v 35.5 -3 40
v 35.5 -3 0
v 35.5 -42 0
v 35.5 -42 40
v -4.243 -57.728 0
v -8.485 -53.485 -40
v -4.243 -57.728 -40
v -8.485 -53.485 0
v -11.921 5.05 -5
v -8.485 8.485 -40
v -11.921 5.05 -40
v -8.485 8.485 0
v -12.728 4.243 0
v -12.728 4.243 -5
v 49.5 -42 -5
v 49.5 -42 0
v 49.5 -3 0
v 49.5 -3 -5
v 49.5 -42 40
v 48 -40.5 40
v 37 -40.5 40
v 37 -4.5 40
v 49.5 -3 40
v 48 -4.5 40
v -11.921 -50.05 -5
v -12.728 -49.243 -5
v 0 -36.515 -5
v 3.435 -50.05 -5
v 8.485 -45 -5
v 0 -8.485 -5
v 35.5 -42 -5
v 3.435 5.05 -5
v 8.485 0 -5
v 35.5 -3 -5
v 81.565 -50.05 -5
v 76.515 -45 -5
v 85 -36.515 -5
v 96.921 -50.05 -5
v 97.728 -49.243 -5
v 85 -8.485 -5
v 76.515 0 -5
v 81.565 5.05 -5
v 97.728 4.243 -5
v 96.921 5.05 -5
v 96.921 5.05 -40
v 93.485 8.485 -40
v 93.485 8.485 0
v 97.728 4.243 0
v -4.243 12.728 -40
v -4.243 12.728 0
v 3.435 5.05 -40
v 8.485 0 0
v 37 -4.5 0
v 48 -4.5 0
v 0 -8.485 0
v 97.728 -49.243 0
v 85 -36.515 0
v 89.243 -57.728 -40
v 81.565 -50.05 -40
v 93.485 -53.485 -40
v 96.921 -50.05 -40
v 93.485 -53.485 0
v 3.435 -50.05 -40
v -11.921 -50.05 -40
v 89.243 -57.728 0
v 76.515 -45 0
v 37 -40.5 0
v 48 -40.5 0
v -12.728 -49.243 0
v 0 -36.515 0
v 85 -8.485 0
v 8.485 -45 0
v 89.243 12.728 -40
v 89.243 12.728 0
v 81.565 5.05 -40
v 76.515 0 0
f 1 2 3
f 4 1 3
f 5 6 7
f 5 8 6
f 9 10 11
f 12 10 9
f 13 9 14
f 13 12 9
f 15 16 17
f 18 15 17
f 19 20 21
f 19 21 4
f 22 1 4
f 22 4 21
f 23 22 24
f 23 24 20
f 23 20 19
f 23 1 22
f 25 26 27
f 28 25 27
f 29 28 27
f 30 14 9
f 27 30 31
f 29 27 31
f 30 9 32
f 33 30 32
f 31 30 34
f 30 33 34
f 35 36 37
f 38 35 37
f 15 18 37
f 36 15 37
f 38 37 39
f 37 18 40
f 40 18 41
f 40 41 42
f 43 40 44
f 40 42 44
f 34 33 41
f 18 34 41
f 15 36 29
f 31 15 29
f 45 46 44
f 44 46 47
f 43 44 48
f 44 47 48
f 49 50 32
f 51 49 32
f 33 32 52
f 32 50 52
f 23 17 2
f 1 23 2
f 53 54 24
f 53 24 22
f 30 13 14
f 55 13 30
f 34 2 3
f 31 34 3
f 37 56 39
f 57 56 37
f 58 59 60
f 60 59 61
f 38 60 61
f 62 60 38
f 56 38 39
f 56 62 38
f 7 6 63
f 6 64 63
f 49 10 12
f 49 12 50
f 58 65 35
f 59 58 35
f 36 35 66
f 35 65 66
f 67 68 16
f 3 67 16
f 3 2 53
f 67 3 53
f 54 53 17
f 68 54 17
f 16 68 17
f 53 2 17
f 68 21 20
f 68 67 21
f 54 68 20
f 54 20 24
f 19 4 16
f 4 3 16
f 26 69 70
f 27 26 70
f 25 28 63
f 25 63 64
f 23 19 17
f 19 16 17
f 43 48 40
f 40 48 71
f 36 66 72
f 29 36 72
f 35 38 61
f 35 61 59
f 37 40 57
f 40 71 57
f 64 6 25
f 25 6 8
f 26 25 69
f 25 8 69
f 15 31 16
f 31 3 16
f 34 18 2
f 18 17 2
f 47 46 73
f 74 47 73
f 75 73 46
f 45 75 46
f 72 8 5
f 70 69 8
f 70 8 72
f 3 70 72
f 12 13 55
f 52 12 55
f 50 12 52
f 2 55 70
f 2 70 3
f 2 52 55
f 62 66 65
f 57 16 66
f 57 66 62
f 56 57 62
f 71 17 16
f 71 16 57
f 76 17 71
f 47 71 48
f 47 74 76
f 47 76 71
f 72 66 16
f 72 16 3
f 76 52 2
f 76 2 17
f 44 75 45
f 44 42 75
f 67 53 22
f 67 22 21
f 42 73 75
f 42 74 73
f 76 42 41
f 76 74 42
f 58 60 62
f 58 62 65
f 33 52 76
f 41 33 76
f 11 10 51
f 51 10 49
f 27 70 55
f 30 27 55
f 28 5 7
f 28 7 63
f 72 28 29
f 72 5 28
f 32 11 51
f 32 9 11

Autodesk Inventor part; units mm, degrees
ref_plane "YZ Plane" through (0, 0, 0) normal (1, 0, 0) x (0, 1, 0)
ref_plane "XZ Plane" through (0, 0, 0) normal (0, 1, 0) x (-1, 0, 0)
ref_plane "XY Plane" through (0, 0, 0) normal (0, 0, 1) x (1, 0, 0)
sketch "Sketch1" plane through (0, 0, 0) normal (0, 0, 1) x (1, 0, 0)
  line L0 (0, 0) -> (85, 0)
  line L1 (85, 0) -> (85, -45)
  line L2 (85, -45) -> (0, -45)
  line L3 (0, -45) -> (0, 0)
  line L4 (0, -45) -> (-8.4853, -53.4853)
  line L5 (0, -45) -> (12, -45) construction
  line L6 (0, 0) -> (-8.4853, 8.4853)
  line L7 (0, 0) -> (12, 0) construction
  line L8 (85, 0) -> (93.4853, 8.4853)
  line L9 (85, 0) -> (97, 0) construction
  line L10 (85, -45) -> (93.4853, -53.4853)
  line L11 (-8.4853, 8.4853) -> (-4.2426, 12.7279)
  line L12 (-8.4853, 8.4853) -> (-12.7279, 4.2426)
  line L13 (93.4853, 8.4853) -> (89.2426, 12.7279)
  line L14 (93.4853, 8.4853) -> (97.7279, 4.2426)
  line L15 (93.4853, -53.4853) -> (97.7279, -49.2426)
  line L16 (93.4853, -53.4853) -> (89.2426, -57.7279)
  line L17 (-8.4853, -53.4853) -> (-4.2426, -57.7279)
  line L18 (-8.4853, -53.4853) -> (-12.7279, -49.2426)
  line L19 (-12.7279, -49.2426) -> (0, -36.5147)
  line L20 (-4.2426, -57.7279) -> (8.4853, -45)
  line L21 (-12.7279, 4.2426) -> (0, -8.4853)
  line L22 (-4.2426, 12.7279) -> (8.4853, 0)
  line L23 (89.2426, 12.7279) -> (76.5147, 0)
  line L24 (97.7279, 4.2426) -> (85, -8.4853)
  line L25 (97.7279, -49.2426) -> (85, -36.5147)
  line L26 (89.2426, -57.7279) -> (76.5147, -45)
  line L27 (-14.0147, 5.05) -> (99.0147, 5.05)
  line L28 (99.0147, 5.05) -> (99.0147, -50.05)
  line L29 (99.0147, -50.05) -> (-14.0147, -50.05)
  line L30 (-14.0147, -50.05) -> (-14.0147, 5.05)
  line L31 (-14.0147, 5.05) -> (99.0147, -50.05) construction
  line L32 (99.0147, 5.05) -> (-14.0147, -50.05) construction
  line L33 (37, -40.5) -> (48, -40.5)
  line L34 (48, -40.5) -> (48, -4.5)
  line L35 (48, -4.5) -> (37, -4.5)
  line L36 (37, -4.5) -> (37, -40.5)
  line L37 (37, -40.5) -> (48, -4.5) construction
  line L38 (48, -40.5) -> (37, -4.5) construction
  line L39 (49.5, -3) -> (35.5, -3)
  line L40 (35.5, -3) -> (35.5, -42)
  line L41 (35.5, -42) -> (49.5, -42)
  line L42 (49.5, -42) -> (49.5, -3)
  line L43 (49.5, -3) -> (35.5, -42) construction
  line L44 (35.5, -3) -> (49.5, -42) construction
  point P0 (42.5, -22.5)
  point P1 (96.9206, 5.05)
  point P2 (81.5647, 5.05)
  point P3 (81.5647, -50.05)
  point P4 (96.9206, -50.05)
  point P5 (-11.9206, -50.05)
  point P6 (3.4353, -50.05)
  point P7 (3.4353, 5.05)
  point P8 (-11.9206, 5.05)
  point P9 (8.4853, 0)
  dimension "d0" = 85
  dimension "d1" = 45
  dimension "d5" = 135
  dimension "d7" = 45
  dimension "d9" = 6
  dimension "d10" = 6
  dimension "d11" = 6
  dimension "d12" = 55.1
  dimension "d13" = 11
  dimension "d14" = 36
  dimension "d15" = 14
  dimension "d16" = 39
extrude "Extrusion1" add sketch "Sketch1" against normal blind 5 contours L6 L27 L22 L0 | L0 L1 L2 L3 | L3 L21 L12 L27 L6 | L23 L27 L8 L0 | L3 L4 L29 L18 L19 | L8 L27 L14 L24 L1 | L2 L20 L29 L4 | L25 L15 L29 L10 L1 | L2 L10 L29 L26
extrude "Extrusion2" add sketch "Sketch1" against normal blind 40 contours L27 L12 L6 | L6 L11 L22 L27 | L23 L13 L8 L27 | L8 L14 L27 | L29 L20 L17 L4 | L4 L18 L29 | L29 L10 L16 L26 | L29 L15 L10
extrude "Extrusion3" add sketch "Sketch1" along normal blind 40 contours L42 L41 L40 L39
equation "\"BendRadius\" = Thickness"
equation "\"BendReliefWidth\" = Thickness"
equation "\"BendReliefDepth\" = 0.5 * Thickness"
equation "\"CornerReliefSize\" = 4 * Thickness"
equation "\"MinimumRemnant\" = 2 * Thickness"
equation "\"TransitionRadius\" = BendRadius"
equation "\"JacobiRadiusSize\" = BendRadius"
equation "\"GapSize\" = Thickness"
equation "\"Thickness\" = 0.5"
